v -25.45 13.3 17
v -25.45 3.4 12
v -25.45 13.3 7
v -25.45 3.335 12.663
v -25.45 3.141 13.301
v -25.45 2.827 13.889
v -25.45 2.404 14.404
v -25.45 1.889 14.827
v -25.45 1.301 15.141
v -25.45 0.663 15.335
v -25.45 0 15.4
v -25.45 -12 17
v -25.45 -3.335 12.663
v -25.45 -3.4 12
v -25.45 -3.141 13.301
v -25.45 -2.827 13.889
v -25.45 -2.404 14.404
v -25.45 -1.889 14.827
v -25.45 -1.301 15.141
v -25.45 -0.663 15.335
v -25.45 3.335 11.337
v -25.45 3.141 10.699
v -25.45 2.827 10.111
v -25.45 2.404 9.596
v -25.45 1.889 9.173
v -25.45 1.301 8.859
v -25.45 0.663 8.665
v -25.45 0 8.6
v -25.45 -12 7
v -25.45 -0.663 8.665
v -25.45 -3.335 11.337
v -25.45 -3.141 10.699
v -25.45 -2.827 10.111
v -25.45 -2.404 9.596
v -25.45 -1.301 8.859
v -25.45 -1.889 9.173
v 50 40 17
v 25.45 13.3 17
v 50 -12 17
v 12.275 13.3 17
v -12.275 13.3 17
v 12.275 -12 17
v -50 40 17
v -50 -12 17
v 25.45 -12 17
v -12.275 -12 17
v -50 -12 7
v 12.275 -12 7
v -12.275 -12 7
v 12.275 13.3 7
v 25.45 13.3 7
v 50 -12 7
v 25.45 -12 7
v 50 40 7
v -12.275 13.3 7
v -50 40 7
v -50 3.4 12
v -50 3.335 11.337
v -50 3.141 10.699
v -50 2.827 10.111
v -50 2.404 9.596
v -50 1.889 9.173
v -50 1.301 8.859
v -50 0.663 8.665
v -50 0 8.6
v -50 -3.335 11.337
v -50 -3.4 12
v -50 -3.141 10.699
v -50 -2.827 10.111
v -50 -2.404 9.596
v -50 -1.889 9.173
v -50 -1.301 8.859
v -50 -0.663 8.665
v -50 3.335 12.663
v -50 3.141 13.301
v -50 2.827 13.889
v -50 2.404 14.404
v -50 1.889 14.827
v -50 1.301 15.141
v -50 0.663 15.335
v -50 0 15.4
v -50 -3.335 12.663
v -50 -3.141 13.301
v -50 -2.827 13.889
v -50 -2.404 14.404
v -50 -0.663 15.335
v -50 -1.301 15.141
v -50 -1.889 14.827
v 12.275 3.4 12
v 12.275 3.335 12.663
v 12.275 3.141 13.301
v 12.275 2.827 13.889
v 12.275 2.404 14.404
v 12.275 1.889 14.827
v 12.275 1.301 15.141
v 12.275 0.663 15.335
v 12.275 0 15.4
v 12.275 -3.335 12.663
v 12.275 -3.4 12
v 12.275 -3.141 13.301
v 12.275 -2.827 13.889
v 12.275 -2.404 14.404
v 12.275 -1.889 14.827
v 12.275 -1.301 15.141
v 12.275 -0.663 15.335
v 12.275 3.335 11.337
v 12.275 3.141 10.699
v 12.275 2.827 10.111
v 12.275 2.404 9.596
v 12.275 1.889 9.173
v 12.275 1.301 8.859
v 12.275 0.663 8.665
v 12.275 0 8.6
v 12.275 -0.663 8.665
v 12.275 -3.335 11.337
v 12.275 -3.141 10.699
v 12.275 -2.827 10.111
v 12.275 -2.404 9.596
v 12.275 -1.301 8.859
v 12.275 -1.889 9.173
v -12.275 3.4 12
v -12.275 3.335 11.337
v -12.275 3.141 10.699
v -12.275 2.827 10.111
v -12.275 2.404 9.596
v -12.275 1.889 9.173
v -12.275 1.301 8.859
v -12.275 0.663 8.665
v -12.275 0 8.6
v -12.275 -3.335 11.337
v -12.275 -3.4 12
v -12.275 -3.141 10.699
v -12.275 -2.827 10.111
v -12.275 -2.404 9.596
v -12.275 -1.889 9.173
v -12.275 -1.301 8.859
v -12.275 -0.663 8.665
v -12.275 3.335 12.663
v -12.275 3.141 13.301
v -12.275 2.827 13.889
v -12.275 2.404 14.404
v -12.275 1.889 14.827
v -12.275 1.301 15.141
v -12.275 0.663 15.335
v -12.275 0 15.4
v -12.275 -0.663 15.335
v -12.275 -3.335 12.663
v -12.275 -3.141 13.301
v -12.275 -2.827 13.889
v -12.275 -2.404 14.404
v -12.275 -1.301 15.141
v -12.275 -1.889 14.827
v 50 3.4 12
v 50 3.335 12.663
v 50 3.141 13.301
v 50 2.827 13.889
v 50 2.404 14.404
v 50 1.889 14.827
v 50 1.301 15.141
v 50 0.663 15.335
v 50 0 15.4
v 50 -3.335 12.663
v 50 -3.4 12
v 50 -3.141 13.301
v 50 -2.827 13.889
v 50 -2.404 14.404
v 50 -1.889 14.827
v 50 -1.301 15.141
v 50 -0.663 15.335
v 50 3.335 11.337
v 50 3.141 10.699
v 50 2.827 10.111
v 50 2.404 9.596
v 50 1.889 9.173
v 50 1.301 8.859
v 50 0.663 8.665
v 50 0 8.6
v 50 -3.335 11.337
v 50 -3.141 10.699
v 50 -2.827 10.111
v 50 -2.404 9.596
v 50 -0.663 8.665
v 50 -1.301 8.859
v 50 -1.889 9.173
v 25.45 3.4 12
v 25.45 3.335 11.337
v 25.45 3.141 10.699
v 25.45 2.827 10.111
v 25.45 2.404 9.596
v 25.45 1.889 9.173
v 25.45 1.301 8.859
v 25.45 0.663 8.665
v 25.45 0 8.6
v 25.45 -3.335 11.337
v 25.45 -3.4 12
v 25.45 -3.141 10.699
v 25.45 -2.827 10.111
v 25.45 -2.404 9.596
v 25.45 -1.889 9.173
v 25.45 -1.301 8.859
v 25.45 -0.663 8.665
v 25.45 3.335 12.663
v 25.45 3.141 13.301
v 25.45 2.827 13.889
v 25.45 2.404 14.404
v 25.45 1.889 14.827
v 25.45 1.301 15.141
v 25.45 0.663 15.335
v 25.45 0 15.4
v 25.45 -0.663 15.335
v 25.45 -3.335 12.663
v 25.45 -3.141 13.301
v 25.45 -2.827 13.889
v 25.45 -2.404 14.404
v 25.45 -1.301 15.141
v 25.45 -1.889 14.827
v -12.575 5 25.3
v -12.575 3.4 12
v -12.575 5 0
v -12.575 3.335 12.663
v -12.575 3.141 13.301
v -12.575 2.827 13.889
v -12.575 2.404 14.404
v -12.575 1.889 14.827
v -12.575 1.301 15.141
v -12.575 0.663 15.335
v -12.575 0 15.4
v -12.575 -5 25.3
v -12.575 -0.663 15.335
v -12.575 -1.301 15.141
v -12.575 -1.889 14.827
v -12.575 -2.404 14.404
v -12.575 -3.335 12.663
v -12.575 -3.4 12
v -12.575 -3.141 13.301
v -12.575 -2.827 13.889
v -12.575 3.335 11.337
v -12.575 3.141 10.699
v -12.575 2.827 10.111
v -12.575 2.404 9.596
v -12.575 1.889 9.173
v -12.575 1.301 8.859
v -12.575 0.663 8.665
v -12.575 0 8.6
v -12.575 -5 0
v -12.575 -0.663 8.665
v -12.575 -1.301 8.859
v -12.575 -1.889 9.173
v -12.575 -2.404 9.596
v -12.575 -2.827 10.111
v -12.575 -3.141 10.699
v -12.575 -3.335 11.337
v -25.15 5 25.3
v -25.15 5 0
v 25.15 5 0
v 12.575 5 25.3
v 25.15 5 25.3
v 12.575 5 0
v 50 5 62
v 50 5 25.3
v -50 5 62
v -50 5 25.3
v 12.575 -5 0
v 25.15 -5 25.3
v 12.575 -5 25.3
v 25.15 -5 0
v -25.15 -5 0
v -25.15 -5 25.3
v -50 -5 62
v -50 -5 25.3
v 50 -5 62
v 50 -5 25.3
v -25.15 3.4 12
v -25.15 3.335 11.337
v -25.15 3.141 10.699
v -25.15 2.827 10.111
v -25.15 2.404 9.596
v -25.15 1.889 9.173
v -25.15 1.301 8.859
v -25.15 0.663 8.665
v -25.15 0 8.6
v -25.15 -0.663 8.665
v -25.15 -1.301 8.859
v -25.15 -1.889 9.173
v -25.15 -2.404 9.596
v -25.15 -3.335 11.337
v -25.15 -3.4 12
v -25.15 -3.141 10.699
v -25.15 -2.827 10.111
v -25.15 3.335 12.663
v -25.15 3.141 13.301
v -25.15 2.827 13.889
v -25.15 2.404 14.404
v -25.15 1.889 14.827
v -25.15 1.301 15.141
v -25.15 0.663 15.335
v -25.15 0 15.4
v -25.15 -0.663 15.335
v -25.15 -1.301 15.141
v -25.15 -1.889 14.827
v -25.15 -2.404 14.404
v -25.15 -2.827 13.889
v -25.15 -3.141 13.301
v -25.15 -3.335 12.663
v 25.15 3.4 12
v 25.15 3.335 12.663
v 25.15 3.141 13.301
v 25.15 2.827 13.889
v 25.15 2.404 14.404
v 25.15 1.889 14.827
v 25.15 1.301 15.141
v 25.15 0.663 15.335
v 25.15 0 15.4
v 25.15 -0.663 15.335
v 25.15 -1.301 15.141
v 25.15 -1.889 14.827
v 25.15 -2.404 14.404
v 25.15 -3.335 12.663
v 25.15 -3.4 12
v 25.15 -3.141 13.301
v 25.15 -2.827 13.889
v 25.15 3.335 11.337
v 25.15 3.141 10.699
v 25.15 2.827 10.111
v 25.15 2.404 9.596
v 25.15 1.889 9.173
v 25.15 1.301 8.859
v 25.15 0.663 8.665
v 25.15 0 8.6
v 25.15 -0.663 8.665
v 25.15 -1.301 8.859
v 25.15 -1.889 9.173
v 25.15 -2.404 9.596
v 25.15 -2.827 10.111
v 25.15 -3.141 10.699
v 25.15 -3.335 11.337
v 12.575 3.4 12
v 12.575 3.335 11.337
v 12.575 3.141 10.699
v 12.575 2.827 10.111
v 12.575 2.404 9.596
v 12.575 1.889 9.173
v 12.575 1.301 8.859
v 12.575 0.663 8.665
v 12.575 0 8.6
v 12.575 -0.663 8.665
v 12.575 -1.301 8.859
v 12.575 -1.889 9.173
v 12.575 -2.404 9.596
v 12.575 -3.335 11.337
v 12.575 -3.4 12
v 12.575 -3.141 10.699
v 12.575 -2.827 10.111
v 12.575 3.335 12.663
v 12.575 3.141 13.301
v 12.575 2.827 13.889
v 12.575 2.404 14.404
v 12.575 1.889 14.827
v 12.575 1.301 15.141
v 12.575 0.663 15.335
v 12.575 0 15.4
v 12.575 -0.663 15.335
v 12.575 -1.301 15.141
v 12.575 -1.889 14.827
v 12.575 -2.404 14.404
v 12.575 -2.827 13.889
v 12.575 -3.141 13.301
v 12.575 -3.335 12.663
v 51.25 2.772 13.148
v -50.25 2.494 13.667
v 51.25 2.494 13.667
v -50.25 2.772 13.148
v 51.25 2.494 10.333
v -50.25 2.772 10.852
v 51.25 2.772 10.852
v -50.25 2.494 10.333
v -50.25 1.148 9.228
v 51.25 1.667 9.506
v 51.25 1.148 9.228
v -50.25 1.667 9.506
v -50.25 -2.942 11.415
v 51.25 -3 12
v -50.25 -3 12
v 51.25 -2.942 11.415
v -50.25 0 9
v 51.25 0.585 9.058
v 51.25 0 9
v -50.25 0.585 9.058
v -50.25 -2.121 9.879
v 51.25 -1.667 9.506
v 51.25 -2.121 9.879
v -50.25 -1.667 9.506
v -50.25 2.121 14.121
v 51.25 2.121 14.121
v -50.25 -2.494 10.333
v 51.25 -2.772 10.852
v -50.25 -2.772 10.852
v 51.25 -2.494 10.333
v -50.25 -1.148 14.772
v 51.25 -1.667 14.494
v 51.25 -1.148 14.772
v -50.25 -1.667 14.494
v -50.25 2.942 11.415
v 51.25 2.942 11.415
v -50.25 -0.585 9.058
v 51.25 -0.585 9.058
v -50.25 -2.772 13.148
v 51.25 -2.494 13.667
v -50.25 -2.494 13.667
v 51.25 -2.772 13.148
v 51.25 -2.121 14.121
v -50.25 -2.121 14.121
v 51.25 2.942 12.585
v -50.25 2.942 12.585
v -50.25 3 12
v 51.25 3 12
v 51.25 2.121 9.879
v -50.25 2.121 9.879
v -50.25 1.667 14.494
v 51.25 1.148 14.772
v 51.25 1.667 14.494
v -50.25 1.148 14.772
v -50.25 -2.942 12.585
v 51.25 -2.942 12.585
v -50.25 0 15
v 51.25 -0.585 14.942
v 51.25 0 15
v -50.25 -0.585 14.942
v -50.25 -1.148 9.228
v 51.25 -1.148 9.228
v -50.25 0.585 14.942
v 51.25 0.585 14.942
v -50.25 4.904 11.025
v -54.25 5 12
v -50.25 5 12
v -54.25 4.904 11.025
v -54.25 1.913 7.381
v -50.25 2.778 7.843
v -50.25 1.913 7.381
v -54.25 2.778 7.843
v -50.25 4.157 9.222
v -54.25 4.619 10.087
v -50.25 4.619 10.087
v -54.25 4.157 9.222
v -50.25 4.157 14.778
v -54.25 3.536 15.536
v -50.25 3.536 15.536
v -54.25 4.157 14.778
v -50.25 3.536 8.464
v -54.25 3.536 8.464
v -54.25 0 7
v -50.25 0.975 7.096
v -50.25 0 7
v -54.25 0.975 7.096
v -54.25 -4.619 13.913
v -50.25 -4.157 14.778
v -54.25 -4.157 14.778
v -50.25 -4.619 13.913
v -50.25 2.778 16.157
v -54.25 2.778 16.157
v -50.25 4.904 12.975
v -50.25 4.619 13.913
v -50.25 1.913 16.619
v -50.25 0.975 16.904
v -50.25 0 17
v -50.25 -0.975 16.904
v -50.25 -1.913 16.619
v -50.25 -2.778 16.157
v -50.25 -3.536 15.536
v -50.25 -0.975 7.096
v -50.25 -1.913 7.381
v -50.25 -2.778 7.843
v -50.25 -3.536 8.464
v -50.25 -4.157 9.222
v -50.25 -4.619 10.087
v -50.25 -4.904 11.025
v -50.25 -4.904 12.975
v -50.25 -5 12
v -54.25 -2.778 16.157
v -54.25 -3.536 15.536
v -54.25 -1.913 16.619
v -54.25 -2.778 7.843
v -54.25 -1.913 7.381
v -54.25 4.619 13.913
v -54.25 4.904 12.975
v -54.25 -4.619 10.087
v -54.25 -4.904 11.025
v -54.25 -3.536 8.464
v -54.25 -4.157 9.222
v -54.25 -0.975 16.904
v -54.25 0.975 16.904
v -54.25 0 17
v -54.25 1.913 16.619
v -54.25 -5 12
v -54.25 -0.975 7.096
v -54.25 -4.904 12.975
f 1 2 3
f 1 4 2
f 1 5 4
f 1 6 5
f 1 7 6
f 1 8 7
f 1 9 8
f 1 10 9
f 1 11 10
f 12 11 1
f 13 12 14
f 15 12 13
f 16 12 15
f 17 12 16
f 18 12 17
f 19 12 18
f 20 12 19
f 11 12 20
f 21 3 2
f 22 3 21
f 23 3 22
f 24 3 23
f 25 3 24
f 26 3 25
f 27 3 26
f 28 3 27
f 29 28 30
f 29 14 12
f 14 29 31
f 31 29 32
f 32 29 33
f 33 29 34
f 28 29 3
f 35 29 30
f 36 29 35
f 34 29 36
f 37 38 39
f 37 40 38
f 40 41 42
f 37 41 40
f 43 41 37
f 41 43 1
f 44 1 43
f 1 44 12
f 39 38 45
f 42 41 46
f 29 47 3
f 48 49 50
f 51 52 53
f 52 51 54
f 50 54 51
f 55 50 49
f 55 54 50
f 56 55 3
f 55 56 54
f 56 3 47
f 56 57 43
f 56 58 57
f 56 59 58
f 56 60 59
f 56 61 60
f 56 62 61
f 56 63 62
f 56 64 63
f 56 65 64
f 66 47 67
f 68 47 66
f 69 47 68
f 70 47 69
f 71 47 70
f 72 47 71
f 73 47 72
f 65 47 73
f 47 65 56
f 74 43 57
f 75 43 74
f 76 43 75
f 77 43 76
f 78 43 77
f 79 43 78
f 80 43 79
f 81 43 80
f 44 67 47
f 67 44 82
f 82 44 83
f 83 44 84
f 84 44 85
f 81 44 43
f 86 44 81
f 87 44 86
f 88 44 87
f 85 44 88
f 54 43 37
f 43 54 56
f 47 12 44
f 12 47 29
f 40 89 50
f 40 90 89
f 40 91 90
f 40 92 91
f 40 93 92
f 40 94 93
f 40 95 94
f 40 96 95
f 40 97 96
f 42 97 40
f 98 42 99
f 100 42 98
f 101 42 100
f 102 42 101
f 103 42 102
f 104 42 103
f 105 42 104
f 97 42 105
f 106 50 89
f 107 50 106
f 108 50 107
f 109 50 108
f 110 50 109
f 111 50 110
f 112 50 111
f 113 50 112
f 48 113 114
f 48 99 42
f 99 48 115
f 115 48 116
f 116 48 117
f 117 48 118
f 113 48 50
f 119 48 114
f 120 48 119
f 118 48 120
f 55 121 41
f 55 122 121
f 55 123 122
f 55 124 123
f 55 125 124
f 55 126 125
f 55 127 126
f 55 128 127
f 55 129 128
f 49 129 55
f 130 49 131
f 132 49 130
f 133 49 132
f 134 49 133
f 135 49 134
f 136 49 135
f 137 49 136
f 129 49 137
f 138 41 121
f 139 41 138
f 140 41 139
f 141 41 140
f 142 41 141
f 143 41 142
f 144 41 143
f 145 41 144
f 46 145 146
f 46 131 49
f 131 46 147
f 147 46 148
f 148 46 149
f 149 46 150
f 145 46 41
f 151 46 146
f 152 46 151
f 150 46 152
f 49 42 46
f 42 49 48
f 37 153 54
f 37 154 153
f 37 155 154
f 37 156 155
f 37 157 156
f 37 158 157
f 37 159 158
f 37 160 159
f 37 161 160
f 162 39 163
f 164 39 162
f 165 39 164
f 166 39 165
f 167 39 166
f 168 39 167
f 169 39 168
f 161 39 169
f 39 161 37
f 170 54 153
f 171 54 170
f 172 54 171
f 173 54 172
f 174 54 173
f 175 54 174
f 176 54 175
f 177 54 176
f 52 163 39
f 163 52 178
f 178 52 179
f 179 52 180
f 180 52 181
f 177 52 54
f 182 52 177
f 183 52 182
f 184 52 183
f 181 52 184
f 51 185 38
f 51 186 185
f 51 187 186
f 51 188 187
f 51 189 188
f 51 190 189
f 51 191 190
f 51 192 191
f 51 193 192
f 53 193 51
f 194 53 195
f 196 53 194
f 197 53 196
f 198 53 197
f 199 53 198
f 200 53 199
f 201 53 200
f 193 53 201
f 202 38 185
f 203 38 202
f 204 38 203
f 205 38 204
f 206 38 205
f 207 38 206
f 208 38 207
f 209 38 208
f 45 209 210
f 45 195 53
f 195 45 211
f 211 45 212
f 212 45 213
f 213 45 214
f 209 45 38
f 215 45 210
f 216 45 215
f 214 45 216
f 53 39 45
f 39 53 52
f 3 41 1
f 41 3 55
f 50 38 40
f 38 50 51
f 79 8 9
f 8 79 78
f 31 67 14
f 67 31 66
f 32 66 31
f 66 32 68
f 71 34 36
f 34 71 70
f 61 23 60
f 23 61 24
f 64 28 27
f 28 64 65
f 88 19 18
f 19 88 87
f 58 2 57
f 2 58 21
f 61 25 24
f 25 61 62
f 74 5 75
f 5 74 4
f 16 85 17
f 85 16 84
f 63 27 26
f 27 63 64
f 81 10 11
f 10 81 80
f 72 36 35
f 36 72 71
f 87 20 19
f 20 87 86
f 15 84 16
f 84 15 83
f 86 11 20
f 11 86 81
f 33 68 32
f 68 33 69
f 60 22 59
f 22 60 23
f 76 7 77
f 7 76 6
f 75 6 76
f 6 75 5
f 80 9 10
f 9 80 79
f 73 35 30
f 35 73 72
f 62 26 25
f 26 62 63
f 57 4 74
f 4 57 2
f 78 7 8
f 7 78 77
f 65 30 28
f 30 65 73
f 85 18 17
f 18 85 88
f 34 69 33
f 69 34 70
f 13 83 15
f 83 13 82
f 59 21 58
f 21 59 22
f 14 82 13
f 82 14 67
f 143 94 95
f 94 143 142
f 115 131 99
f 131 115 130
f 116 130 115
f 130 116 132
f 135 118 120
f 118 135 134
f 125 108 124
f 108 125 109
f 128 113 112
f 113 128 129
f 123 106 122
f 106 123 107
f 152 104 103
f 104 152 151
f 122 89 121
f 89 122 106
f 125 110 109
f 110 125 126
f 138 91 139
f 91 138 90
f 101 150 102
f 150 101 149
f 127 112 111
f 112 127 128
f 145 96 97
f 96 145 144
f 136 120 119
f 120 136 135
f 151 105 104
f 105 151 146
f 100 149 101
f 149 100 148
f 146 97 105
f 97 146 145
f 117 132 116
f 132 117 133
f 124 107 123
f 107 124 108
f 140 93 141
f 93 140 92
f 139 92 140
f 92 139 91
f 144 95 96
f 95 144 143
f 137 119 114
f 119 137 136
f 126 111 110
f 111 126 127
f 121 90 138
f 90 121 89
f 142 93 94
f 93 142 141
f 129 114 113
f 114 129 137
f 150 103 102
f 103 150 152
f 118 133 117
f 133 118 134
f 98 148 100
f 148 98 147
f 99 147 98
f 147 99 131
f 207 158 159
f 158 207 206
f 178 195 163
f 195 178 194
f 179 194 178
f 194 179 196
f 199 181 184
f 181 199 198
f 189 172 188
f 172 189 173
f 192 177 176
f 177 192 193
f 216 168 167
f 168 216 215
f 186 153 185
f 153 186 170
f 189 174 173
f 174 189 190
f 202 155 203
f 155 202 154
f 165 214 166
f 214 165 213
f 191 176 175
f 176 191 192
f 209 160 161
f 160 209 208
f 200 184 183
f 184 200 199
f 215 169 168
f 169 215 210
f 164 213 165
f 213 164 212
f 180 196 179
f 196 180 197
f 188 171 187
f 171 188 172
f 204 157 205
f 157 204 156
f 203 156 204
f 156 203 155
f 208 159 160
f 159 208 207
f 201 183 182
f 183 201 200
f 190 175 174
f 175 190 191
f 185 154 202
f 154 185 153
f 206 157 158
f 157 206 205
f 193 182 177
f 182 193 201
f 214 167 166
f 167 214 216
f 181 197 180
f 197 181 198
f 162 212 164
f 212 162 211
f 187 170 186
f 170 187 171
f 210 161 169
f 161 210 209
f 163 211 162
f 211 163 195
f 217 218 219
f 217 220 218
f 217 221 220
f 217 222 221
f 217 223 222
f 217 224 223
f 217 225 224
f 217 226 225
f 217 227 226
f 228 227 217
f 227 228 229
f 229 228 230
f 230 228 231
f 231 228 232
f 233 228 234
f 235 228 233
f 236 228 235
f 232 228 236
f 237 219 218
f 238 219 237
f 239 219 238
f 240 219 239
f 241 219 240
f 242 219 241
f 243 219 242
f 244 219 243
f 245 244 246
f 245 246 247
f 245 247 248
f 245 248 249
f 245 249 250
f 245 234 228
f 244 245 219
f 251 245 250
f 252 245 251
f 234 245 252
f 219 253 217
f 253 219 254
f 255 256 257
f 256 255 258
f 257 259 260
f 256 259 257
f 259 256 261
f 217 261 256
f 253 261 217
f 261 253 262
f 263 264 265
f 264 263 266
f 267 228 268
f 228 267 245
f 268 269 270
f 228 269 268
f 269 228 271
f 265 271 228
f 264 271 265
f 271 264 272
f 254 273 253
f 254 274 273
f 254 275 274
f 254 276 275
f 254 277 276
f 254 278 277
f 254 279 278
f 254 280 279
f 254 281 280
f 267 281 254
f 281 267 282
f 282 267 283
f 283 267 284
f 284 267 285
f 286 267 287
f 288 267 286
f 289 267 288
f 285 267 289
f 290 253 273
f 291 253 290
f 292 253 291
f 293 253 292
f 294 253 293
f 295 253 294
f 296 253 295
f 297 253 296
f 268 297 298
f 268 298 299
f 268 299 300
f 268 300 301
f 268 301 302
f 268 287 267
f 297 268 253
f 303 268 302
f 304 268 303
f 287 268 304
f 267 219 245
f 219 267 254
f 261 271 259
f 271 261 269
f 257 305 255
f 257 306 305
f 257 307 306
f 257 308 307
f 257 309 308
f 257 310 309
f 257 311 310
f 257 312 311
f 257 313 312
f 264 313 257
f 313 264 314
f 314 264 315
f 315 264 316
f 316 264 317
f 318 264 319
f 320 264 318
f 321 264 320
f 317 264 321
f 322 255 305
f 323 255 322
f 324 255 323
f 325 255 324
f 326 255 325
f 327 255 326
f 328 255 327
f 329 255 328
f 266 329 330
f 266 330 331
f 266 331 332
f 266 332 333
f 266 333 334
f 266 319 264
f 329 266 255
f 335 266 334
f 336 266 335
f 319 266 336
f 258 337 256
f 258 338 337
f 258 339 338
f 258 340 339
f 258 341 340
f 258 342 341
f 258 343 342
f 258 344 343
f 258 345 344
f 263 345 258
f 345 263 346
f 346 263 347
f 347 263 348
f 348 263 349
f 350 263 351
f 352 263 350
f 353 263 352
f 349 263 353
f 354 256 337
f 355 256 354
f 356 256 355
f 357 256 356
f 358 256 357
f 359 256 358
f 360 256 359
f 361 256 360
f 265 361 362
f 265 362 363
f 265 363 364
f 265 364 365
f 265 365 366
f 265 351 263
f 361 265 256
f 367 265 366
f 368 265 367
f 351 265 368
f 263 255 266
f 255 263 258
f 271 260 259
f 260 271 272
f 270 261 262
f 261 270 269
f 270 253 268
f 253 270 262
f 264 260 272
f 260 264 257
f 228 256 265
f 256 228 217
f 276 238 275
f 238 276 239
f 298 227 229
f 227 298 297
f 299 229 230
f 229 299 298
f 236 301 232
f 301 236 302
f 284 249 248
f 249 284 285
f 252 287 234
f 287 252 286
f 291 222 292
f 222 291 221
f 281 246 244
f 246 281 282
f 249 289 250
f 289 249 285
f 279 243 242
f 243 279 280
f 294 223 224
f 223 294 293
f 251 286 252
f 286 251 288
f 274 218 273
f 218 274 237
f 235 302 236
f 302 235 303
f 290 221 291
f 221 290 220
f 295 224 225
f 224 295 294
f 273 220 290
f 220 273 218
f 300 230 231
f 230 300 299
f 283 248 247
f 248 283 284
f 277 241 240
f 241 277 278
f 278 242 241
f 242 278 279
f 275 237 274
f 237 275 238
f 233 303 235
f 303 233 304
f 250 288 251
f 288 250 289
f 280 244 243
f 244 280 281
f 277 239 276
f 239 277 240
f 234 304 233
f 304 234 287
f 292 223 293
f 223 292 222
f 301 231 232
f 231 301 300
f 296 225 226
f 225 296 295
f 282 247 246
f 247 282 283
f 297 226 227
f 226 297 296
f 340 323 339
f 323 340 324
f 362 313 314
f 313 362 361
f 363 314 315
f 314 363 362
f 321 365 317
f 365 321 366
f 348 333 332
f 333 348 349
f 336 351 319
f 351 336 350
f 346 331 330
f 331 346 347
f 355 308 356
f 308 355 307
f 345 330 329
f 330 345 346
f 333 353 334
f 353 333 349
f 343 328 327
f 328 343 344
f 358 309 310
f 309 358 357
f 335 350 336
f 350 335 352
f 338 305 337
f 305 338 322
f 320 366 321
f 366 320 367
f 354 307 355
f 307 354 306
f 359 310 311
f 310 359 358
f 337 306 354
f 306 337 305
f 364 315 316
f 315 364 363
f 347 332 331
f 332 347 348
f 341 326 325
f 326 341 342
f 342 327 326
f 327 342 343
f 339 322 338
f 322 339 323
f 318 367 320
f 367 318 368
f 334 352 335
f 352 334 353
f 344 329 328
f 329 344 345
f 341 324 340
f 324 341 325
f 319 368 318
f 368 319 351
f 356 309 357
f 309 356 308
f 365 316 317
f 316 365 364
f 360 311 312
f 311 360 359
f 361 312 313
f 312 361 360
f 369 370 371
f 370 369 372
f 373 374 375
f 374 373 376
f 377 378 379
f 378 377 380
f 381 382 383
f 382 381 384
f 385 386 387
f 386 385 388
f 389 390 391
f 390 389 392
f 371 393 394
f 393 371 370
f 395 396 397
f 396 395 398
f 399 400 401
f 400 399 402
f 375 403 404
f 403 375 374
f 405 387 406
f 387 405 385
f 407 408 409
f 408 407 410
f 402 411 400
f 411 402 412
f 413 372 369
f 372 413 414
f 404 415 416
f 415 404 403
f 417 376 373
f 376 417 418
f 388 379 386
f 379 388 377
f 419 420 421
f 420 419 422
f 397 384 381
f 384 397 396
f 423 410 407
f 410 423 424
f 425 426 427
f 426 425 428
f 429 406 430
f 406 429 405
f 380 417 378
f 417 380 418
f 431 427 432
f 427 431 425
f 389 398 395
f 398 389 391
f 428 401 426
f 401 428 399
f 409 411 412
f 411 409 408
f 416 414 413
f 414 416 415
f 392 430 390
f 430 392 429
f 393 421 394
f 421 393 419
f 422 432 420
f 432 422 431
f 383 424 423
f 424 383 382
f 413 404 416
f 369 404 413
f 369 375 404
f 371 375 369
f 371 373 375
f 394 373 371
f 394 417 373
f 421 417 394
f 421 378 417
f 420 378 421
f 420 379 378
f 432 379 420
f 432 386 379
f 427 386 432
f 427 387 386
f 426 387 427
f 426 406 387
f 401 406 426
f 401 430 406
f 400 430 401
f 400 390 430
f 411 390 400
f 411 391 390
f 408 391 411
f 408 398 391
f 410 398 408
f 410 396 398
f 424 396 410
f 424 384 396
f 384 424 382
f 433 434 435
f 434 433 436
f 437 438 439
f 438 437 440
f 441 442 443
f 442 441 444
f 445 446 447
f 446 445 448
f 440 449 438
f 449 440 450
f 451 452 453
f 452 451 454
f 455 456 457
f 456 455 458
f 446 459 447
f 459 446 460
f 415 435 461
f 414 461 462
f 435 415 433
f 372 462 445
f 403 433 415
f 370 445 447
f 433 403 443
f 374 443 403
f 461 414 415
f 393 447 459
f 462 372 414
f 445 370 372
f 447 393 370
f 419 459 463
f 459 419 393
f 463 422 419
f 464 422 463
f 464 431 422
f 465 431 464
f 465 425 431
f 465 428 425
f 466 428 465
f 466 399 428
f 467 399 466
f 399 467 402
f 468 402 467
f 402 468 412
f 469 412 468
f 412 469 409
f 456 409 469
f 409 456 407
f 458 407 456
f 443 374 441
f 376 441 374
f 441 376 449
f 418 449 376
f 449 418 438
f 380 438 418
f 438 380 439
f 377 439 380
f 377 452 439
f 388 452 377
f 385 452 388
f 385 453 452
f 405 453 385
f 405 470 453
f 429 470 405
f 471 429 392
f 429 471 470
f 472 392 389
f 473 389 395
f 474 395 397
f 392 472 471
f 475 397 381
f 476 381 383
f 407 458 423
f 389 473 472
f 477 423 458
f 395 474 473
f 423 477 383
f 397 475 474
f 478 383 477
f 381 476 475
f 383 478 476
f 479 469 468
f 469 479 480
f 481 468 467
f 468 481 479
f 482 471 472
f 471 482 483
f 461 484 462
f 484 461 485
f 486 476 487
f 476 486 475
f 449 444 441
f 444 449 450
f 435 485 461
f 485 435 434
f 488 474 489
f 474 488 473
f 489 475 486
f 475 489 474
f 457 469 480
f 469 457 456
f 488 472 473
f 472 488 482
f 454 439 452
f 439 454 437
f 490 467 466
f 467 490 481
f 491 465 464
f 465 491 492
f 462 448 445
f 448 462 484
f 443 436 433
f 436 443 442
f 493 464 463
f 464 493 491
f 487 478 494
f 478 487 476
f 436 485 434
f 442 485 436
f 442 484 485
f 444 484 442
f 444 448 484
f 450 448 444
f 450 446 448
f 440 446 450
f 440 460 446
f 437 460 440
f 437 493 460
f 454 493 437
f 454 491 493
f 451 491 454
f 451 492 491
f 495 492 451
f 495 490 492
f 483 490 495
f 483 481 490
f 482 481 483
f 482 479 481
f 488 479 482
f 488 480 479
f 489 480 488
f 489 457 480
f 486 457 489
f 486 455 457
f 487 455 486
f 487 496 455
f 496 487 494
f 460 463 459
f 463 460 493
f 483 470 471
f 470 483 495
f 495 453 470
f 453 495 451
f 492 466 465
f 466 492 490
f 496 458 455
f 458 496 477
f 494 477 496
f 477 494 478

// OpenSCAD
$fn = 32;

// ------------------------------------------------------------------------
// Butt hinge: hinge 100 mm, leaf swung 270 deg
// Every part is its own module, assembly() places every instance.
// ------------------------------------------------------------------------

// --- part 1 ---
module hinge_base() {
  difference() {
    union() {
      translate([-50, -12, -5]) cube([24.55, 52, 10]);
      translate([-12.275, -12, -5]) cube([24.55, 52, 10]);
      translate([25.45, -12, -5]) cube([24.55, 52, 10]);
      translate([-50, 13.3, -5]) cube([100, 26.7, 10]);
    }
    translate([-37.725, 0, 0]) rotate([0, 90, 0]) cylinder(h = 26.55, d = 6.8, center = true);
    translate([0, 0, 0]) rotate([0, 90, 0]) cylinder(h = 26.55, d = 6.8, center = true);
    translate([37.725, 0, 0]) rotate([0, 90, 0]) cylinder(h = 26.55, d = 6.8, center = true);
  }
}

// --- part 2 ---
module hinge_mover() {
  difference() {
    union() {
      translate([-25.15, -50, -5]) cube([12.575, 62, 10]);
      translate([12.575, -50, -5]) cube([12.575, 62, 10]);
      translate([-50, -50, -5]) cube([100, 36.7, 10]);
    }
    translate([-18.863, 0, 0]) rotate([0, 90, 0]) cylinder(h = 14.575, d = 6.8, center = true);
    translate([18.863, 0, 0]) rotate([0, 90, 0]) cylinder(h = 14.575, d = 6.8, center = true);
  }
}

// --- part 3 ---
module hinge_pin() {
  rotate([0, 90, 0]) cylinder(h = 102.5, d = 6, center = true);
  translate([-54.25, 0, 0]) rotate([0, 90, 0]) cylinder(h = 4, d = 10);
}

// --- assembly ---
module assembly() {
  color([0.80, 0.24, 0.20]) translate([0, 0, 12]) rotate([0, 0, 0]) hinge_base();
  color([0.20, 0.45, 0.75]) translate([0, 0, 12]) rotate([270, 0, 0]) hinge_mover();
  color([0.25, 0.62, 0.32]) translate([0, 0, 12]) rotate([0, 0, 0]) hinge_pin();
}

assembly();
